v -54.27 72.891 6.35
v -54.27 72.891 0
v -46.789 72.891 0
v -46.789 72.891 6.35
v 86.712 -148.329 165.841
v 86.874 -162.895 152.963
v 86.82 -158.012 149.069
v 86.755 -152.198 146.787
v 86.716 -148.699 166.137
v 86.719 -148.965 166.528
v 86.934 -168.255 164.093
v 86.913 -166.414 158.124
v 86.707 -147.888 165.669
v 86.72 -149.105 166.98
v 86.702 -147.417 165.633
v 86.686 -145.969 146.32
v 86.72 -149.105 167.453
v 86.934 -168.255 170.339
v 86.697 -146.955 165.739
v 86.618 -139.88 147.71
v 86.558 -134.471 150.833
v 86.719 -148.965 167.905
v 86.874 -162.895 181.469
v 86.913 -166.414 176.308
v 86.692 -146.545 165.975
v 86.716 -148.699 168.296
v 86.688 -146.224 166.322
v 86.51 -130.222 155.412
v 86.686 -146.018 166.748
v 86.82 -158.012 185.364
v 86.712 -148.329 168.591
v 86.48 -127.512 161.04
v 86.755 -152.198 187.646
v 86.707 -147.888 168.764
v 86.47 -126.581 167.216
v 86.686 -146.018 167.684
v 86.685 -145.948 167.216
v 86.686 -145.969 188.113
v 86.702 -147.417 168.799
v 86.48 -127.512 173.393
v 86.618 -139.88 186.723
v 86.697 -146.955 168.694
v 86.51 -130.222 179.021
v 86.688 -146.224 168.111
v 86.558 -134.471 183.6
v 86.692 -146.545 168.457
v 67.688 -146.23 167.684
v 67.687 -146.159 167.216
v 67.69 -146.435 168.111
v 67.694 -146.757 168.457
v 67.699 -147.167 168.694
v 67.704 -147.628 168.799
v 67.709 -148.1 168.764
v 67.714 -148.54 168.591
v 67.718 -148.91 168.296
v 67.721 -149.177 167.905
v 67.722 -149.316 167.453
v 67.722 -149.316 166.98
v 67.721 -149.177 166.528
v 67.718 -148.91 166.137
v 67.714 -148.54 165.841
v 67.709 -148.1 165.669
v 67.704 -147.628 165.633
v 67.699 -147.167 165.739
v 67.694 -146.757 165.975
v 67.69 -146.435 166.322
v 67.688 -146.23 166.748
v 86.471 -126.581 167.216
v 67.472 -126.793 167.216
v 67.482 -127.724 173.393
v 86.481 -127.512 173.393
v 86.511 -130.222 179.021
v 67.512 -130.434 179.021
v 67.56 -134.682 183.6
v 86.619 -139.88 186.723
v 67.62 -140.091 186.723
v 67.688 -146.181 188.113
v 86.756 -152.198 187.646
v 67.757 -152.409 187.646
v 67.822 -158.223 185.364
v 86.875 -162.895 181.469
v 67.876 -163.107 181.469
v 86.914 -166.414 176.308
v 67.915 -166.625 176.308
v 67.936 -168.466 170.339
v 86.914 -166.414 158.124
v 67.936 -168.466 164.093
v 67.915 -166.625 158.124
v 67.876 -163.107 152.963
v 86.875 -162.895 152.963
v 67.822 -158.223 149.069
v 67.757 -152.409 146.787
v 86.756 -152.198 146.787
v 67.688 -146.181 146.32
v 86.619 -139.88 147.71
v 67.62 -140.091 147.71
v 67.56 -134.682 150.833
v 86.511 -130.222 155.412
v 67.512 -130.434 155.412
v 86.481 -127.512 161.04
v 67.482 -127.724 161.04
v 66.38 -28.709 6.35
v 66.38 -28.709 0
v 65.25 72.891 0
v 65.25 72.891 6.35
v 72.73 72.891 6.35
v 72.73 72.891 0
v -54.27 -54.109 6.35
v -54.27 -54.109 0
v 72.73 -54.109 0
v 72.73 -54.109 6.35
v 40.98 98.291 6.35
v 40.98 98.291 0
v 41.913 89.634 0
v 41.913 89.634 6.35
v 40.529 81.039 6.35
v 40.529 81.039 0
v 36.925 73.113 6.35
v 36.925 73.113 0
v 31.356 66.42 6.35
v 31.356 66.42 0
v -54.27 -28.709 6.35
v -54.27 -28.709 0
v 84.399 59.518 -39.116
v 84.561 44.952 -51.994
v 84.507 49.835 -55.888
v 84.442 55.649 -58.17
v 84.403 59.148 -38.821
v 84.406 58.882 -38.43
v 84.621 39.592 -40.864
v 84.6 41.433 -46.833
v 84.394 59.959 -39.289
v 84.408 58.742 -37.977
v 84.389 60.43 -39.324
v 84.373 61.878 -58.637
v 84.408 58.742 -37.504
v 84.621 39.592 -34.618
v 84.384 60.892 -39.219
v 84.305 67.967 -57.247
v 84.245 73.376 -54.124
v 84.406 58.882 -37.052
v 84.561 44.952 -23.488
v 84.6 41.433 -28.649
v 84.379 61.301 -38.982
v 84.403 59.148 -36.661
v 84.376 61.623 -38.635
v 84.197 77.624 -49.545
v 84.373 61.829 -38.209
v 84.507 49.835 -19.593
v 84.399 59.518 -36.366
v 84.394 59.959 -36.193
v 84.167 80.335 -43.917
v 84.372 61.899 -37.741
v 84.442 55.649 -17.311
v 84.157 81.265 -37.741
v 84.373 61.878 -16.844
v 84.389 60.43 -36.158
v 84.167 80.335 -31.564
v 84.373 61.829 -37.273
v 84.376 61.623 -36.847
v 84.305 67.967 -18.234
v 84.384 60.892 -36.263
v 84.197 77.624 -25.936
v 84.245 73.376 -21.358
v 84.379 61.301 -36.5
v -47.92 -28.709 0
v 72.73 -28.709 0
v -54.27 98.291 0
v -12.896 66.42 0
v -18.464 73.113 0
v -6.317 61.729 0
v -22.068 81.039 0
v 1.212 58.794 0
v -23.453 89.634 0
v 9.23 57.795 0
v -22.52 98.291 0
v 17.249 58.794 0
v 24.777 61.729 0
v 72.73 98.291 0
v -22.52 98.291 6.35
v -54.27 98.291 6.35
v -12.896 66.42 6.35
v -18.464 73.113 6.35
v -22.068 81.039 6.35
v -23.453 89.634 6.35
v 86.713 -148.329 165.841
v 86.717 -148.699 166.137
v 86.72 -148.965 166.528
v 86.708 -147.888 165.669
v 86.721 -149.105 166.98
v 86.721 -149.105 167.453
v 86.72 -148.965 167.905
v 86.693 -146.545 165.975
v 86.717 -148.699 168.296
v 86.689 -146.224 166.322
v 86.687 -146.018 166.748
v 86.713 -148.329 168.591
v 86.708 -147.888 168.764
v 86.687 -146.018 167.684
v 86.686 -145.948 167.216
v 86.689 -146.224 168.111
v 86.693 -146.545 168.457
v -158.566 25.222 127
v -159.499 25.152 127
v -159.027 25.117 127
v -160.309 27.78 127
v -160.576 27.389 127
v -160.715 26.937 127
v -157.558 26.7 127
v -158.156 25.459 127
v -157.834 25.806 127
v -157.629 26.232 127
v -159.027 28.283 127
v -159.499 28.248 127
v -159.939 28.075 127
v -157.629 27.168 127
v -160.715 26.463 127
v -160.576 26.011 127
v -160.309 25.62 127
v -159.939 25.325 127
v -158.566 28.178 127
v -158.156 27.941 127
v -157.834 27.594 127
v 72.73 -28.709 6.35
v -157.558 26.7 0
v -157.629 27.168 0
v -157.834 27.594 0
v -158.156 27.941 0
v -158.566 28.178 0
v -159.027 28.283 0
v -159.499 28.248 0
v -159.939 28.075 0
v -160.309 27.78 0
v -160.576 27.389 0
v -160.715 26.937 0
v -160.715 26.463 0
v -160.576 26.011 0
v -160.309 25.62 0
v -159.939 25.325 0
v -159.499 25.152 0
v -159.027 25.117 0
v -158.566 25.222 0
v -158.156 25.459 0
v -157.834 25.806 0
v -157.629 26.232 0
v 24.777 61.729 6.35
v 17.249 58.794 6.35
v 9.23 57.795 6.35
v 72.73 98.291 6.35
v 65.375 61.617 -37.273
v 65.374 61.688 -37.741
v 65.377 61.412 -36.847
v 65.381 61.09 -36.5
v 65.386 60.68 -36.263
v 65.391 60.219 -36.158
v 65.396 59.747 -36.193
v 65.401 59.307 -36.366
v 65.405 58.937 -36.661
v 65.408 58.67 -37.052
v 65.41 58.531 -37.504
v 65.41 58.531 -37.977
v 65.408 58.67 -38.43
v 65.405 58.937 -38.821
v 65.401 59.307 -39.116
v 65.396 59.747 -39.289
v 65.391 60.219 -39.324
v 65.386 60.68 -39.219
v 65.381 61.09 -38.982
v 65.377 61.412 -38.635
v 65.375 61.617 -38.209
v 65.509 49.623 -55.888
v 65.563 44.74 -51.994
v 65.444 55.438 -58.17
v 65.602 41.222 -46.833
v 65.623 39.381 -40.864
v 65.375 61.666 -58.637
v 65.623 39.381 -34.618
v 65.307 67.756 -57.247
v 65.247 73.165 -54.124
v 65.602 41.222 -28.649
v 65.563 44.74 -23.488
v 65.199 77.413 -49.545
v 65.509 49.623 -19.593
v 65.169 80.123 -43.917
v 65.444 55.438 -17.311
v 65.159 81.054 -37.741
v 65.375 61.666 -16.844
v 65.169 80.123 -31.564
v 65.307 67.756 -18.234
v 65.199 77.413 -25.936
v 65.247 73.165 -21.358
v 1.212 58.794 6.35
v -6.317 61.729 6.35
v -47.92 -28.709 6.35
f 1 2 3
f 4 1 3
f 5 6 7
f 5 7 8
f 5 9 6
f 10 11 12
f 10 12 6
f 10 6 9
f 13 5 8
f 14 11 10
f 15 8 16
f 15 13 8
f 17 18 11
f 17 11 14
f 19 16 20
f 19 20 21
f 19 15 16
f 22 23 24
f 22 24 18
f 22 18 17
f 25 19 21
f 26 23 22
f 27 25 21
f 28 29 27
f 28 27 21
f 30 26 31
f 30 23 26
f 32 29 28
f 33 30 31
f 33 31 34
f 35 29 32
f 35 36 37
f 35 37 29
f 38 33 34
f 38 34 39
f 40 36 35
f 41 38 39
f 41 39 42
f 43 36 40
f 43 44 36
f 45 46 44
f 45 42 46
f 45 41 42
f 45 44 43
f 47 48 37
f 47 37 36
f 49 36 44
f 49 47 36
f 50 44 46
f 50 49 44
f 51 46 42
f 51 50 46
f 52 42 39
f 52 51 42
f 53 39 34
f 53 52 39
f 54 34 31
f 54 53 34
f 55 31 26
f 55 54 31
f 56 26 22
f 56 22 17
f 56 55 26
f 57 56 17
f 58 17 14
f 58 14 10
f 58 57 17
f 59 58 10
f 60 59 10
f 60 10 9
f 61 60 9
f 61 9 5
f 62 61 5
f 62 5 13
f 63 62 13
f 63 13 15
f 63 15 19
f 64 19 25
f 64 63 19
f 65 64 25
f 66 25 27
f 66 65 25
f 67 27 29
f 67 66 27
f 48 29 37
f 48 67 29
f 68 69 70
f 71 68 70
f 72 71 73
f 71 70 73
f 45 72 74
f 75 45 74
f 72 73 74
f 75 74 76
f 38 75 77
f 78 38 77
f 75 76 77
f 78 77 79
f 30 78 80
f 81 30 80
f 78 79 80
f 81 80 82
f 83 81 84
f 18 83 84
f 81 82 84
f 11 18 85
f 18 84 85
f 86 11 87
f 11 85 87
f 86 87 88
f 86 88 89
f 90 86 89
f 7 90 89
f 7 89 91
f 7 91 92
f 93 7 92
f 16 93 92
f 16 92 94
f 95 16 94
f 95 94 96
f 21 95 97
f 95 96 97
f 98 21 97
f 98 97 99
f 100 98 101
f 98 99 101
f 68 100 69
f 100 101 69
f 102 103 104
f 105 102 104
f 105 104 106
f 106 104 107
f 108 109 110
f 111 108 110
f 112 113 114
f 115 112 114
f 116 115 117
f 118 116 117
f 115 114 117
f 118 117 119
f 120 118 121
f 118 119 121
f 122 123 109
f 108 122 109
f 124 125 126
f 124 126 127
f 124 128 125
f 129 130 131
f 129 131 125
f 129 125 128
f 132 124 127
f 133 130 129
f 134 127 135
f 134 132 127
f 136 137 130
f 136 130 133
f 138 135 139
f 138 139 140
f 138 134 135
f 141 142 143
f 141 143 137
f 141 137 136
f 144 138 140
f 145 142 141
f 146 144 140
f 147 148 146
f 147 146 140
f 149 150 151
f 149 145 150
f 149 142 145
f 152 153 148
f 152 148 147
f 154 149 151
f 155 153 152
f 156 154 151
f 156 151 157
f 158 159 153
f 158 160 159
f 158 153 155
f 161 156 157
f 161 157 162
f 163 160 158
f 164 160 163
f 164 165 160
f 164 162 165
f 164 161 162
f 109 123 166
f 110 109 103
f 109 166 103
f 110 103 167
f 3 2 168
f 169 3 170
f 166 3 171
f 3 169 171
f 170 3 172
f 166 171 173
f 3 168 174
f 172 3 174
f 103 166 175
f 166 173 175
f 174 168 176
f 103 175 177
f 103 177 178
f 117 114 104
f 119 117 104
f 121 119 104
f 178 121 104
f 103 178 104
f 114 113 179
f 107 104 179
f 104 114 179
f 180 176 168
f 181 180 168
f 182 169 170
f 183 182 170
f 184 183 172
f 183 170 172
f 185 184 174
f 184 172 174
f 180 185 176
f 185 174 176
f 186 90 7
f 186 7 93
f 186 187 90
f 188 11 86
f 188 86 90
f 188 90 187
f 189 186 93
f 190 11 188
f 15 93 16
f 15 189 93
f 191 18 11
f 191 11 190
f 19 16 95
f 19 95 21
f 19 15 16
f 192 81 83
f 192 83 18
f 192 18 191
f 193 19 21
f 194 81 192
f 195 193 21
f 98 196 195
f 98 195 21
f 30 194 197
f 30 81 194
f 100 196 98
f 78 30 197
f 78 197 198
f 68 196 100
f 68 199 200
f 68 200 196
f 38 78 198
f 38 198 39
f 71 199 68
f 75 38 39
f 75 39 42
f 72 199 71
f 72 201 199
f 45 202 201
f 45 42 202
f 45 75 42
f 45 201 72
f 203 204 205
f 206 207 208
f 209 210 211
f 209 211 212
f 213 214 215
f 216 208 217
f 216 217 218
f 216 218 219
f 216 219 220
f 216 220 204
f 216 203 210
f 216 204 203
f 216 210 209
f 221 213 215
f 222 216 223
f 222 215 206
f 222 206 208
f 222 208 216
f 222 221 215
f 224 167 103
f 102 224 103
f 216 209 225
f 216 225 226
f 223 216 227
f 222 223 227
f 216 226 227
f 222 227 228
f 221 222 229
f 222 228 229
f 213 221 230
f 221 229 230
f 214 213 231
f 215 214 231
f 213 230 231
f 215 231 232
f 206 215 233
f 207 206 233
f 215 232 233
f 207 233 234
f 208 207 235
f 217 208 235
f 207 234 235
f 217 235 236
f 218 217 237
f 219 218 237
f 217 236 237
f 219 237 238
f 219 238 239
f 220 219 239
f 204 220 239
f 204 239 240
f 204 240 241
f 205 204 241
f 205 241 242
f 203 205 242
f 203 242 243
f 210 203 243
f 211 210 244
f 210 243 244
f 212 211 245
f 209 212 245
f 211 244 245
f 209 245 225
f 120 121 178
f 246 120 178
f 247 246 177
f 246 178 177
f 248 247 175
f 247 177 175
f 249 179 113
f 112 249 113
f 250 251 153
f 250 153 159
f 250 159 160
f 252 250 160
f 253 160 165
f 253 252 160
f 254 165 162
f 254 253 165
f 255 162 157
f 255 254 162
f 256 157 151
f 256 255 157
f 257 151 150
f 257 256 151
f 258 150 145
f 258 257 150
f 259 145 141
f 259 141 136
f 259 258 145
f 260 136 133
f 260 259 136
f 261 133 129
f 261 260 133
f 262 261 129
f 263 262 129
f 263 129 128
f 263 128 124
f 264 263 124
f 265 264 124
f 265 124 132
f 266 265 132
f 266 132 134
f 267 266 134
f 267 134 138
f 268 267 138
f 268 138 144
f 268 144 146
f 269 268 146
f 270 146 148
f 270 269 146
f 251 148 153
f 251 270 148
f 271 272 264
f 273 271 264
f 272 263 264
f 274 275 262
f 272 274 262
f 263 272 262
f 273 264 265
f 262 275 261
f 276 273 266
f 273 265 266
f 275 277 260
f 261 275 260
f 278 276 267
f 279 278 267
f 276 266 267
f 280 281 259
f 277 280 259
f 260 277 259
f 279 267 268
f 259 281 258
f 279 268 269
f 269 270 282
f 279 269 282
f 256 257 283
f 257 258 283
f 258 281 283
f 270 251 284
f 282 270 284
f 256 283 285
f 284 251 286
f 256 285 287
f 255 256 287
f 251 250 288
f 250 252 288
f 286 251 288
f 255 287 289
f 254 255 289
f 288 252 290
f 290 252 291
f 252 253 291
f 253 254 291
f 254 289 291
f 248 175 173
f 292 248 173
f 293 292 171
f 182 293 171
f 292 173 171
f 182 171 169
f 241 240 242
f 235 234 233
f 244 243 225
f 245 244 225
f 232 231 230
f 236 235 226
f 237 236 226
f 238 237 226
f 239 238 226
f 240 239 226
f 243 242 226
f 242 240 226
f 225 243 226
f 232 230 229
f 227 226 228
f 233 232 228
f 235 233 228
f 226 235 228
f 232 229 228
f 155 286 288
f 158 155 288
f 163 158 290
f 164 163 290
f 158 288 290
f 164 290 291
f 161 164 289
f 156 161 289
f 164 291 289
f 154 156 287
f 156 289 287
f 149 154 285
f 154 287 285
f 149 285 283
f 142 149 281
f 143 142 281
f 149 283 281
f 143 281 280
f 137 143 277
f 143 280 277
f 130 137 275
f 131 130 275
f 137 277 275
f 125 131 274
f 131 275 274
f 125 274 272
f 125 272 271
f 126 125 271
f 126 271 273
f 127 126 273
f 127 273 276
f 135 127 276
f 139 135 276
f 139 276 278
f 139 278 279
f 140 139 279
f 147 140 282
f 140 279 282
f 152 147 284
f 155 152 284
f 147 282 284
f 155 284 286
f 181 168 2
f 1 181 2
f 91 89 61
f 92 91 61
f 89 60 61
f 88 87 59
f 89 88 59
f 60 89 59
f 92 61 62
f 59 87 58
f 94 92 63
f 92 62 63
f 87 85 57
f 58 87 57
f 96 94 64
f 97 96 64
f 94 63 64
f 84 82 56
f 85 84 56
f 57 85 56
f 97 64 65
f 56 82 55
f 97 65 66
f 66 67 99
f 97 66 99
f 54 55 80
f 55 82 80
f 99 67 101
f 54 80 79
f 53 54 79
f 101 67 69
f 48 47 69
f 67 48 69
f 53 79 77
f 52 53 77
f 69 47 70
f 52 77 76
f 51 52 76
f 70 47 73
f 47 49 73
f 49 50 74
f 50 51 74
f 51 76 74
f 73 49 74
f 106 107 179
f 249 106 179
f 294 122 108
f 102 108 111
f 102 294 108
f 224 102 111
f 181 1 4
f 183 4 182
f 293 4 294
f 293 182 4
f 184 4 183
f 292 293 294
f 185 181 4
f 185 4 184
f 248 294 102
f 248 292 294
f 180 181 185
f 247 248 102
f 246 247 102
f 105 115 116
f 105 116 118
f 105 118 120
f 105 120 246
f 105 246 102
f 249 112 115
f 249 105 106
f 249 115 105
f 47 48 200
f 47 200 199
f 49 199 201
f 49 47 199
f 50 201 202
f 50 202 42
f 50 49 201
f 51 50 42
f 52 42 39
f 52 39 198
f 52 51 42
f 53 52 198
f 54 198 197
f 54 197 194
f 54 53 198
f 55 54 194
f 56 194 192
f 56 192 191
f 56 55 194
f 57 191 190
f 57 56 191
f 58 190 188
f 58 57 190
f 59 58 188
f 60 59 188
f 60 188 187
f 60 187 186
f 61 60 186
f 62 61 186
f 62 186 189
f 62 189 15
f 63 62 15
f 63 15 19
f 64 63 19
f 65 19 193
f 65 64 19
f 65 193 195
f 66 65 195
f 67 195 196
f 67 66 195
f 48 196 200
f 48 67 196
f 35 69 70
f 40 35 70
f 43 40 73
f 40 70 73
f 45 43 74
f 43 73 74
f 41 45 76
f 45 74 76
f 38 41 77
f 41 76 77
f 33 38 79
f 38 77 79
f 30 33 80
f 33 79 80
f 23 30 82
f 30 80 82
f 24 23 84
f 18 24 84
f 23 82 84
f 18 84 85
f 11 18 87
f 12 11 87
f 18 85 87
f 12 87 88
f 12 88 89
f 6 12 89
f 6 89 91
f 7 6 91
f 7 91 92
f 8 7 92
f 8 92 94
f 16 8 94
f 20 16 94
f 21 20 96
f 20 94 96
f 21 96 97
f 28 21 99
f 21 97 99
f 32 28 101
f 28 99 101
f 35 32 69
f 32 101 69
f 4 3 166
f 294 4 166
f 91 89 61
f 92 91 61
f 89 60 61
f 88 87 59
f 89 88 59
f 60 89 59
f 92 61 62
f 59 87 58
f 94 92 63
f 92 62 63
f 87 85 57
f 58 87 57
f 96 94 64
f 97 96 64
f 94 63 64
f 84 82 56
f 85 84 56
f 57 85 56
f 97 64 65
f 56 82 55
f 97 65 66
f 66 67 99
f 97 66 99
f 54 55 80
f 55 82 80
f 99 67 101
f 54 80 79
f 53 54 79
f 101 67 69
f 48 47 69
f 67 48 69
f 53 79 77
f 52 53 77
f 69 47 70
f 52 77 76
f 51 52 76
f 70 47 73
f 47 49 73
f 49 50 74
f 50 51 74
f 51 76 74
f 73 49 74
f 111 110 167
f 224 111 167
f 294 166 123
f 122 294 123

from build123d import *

# Parameters (mm, degrees)
F0_W     = 22.86
F0_H     = 31.75
F0_W_2   = 24.13
F0_H_2   = 25.4
F1_DEPTH = 6.35
F2_R     = 20.955
F2_R_2   = 1.5875
F3_DEPTH = 19
F4_DEPTH = 18.9992
F5_R     = 1.5875
F6_DEPTH = 127


with BuildPart() as f1:
    # F0 (on Top) → F1 (new body)
    with BuildSketch(Plane.XY):
        with BuildLine():
            Line((72.7303429186, 98.2907311208), (40.9803429186, 98.2907311208))
            ThreePointArc((40.9803429186, 98.2907311208), (40.5288228565, 81.0386007186), (31.3563980824, 66.4198970297))
            Line((31.3563980824, 66.4198970297), (33.3603429186, 66.4198970297))
            Line((33.3603429186, 66.4198970297), (33.3603429186, -9.7801029703))
            Line((33.3603429186, -9.7801029703), (9.2303429186, -9.7801029703))
            Line((9.2303429186, -9.7801029703), (9.2303429186, -16.1301029703))
            Line((9.2303429186, -16.1301029703), (33.3603429186, -16.1301029703))
            Line((33.3603429186, -16.1301029703), (33.3603429186, -41.5301029703))
            Line((33.3603429186, -41.5301029703), (9.2303429186, -41.5301029703))
            Line((9.2303429186, -41.5301029703), (9.2303429186, -54.1092688792))
            Line((9.2303429186, -54.1092688792), (72.7303429186, -54.1092688792))
            Line((72.7303429186, -54.1092688792), (72.7303429186, -28.7092688792))
            Line((72.7303429186, -28.7092688792), (66.3803429186, -28.7092688792))
            Line((66.3803429186, -28.7092688792), (65.2497625203, 72.8907311208))
            Line((65.2497625203, 72.8907311208), (72.7303429186, 72.8907311208))
            Line((72.7303429186, 72.8907311208), (72.7303429186, 98.2907311208))
        make_face()
        with Locations((47.9653429186, 12.4448970297)):
            Rectangle(F0_W, F0_H, mode=Mode.SUBTRACT)
        with BuildLine():
            Line((-22.5196570814, 98.2907311208), (-54.2696570814, 98.2907311208))
            Line((-54.2696570814, 98.2907311208), (-54.2696570814, 72.8907311208))
            Line((-54.2696570814, 72.8907311208), (-46.789076683, 72.8907311208))
            Line((-46.789076683, 72.8907311208), (-47.9196570814, -28.7092688792))
            Line((-47.9196570814, -28.7092688792), (-54.2696570814, -28.7092688792))
            Line((-54.2696570814, -28.7092688792), (-54.2696570814, -54.1092688792))
            Line((-54.2696570814, -54.1092688792), (9.2303429186, -54.1092688792))
            Line((9.2303429186, -54.1092688792), (9.2303429186, -41.5301029703))
            Line((9.2303429186, -41.5301029703), (-14.8996570814, -41.5301029703))
            Line((-14.8996570814, -41.5301029703), (-14.8996570814, -16.1301029703))
            Line((-14.8996570814, -16.1301029703), (9.2303429186, -16.1301029703))
            Line((9.2303429186, -16.1301029703), (9.2303429186, -9.7801029703))
            Line((9.2303429186, -9.7801029703), (-14.8996570814, -9.7801029703))
            Line((-14.8996570814, -9.7801029703), (-14.8996570814, 66.4198970297))
            Line((-14.8996570814, 66.4198970297), (-12.8957122452, 66.4198970297))
            ThreePointArc((-12.8957122452, 66.4198970297), (-22.0681370192, 81.0386007186), (-22.5196570814, 98.2907311208))
        make_face()
        with Locations((-29.5046570814, 12.4448970297)):
            Rectangle(F0_W, F0_H, mode=Mode.SUBTRACT)
        with Locations((-2.8346570814, -28.8301029703)):
            Rectangle(F0_W_2, F0_H_2)
        with Locations((21.2953429186, -28.8301029703)):
            Rectangle(F0_W_2, F0_H_2)
        with BuildLine():
            ThreePointArc((31.3563980824, 66.4198970297), (21.1040989763, 60.027732272), (9.2303429186, 57.7953962005))
            Line((9.2303429186, 57.7953962005), (9.2303429186, -9.7801029703))
            Line((9.2303429186, -9.7801029703), (33.3603429186, -9.7801029703))
            Line((33.3603429186, -9.7801029703), (33.3603429186, 66.4198970297))
            Line((33.3603429186, 66.4198970297), (31.3563980824, 66.4198970297))
        make_face()
        with BuildLine():
            ThreePointArc((9.2303429186, 57.7953962005), (-2.643413139, 60.027732272), (-12.8957122452, 66.4198970297))
            Line((-12.8957122452, 66.4198970297), (-14.8996570814, 66.4198970297))
            Line((-14.8996570814, 66.4198970297), (-14.8996570814, -9.7801029703))
            Line((-14.8996570814, -9.7801029703), (9.2303429186, -9.7801029703))
            Line((9.2303429186, -9.7801029703), (9.2303429186, 57.7953962005))
        make_face()
        with Locations((-29.5046570814, 12.4448970297)):
            Rectangle(F0_W, F0_H)
        with Locations((47.9653429186, 12.4448970297)):
            Rectangle(F0_W, F0_H)
    extrude(amount=F1_DEPTH)


with BuildPart() as f3:
    # F2 (on face) → F3 (new body)
    with BuildSketch(Plane(origin=(66.0526939603, 0.7350185143, 0), x_dir=(-0.0111270709, 0.9999380922, 0), z_dir=(0.9999380922, 0.0111270709, 0))):
        with Locations((-148.4907998811, 167.2162994118)):
            Circle(F2_R)
        with Locations((-148.4907998811, 167.2162994118)):
            Circle(F2_R_2, mode=Mode.SUBTRACT)
    extrude(amount=F3_DEPTH)


with BuildPart() as f4:
    # F2 (on face) → F4 (new body)
    with BuildSketch(Plane(origin=(66.0526939603, 0.7350185143, 0), x_dir=(-0.0111270709, 0.9999380922, 0), z_dir=(0.9999380922, 0.0111270709, 0))):
        with Locations((59.3689817467, -37.7408552219)):
            Circle(F2_R)
        with Locations((59.3689817467, -37.7408552219)):
            Circle(F2_R_2, mode=Mode.SUBTRACT)
    extrude(amount=F4_DEPTH)


with BuildPart() as f4b:
    # F2 (on face) → F4, piece 2 (new body)
    with BuildSketch(Plane(origin=(66.0526939603, 0.7350185143, 0), x_dir=(-0.0111270709, 0.9999380922, 0), z_dir=(0.9999380922, 0.0111270709, 0))):
        with Locations((-148.4907998811, 167.2162994118)):
            Circle(F2_R)
        with Locations((-148.4907998811, 167.2162994118)):
            Circle(F2_R_2, mode=Mode.SUBTRACT)
    extrude(amount=F4_DEPTH)


with BuildPart() as f6:
    # F5 (on Top) → F6 (new body)
    with BuildSketch(Plane.XY):
        with Locations((-159.145578742, 26.7000477761)):
            Circle(F5_R)
    extrude(amount=F6_DEPTH)


solid = Compound([f1.part, f3.part, f4.part, f4b.part, f6.part])
